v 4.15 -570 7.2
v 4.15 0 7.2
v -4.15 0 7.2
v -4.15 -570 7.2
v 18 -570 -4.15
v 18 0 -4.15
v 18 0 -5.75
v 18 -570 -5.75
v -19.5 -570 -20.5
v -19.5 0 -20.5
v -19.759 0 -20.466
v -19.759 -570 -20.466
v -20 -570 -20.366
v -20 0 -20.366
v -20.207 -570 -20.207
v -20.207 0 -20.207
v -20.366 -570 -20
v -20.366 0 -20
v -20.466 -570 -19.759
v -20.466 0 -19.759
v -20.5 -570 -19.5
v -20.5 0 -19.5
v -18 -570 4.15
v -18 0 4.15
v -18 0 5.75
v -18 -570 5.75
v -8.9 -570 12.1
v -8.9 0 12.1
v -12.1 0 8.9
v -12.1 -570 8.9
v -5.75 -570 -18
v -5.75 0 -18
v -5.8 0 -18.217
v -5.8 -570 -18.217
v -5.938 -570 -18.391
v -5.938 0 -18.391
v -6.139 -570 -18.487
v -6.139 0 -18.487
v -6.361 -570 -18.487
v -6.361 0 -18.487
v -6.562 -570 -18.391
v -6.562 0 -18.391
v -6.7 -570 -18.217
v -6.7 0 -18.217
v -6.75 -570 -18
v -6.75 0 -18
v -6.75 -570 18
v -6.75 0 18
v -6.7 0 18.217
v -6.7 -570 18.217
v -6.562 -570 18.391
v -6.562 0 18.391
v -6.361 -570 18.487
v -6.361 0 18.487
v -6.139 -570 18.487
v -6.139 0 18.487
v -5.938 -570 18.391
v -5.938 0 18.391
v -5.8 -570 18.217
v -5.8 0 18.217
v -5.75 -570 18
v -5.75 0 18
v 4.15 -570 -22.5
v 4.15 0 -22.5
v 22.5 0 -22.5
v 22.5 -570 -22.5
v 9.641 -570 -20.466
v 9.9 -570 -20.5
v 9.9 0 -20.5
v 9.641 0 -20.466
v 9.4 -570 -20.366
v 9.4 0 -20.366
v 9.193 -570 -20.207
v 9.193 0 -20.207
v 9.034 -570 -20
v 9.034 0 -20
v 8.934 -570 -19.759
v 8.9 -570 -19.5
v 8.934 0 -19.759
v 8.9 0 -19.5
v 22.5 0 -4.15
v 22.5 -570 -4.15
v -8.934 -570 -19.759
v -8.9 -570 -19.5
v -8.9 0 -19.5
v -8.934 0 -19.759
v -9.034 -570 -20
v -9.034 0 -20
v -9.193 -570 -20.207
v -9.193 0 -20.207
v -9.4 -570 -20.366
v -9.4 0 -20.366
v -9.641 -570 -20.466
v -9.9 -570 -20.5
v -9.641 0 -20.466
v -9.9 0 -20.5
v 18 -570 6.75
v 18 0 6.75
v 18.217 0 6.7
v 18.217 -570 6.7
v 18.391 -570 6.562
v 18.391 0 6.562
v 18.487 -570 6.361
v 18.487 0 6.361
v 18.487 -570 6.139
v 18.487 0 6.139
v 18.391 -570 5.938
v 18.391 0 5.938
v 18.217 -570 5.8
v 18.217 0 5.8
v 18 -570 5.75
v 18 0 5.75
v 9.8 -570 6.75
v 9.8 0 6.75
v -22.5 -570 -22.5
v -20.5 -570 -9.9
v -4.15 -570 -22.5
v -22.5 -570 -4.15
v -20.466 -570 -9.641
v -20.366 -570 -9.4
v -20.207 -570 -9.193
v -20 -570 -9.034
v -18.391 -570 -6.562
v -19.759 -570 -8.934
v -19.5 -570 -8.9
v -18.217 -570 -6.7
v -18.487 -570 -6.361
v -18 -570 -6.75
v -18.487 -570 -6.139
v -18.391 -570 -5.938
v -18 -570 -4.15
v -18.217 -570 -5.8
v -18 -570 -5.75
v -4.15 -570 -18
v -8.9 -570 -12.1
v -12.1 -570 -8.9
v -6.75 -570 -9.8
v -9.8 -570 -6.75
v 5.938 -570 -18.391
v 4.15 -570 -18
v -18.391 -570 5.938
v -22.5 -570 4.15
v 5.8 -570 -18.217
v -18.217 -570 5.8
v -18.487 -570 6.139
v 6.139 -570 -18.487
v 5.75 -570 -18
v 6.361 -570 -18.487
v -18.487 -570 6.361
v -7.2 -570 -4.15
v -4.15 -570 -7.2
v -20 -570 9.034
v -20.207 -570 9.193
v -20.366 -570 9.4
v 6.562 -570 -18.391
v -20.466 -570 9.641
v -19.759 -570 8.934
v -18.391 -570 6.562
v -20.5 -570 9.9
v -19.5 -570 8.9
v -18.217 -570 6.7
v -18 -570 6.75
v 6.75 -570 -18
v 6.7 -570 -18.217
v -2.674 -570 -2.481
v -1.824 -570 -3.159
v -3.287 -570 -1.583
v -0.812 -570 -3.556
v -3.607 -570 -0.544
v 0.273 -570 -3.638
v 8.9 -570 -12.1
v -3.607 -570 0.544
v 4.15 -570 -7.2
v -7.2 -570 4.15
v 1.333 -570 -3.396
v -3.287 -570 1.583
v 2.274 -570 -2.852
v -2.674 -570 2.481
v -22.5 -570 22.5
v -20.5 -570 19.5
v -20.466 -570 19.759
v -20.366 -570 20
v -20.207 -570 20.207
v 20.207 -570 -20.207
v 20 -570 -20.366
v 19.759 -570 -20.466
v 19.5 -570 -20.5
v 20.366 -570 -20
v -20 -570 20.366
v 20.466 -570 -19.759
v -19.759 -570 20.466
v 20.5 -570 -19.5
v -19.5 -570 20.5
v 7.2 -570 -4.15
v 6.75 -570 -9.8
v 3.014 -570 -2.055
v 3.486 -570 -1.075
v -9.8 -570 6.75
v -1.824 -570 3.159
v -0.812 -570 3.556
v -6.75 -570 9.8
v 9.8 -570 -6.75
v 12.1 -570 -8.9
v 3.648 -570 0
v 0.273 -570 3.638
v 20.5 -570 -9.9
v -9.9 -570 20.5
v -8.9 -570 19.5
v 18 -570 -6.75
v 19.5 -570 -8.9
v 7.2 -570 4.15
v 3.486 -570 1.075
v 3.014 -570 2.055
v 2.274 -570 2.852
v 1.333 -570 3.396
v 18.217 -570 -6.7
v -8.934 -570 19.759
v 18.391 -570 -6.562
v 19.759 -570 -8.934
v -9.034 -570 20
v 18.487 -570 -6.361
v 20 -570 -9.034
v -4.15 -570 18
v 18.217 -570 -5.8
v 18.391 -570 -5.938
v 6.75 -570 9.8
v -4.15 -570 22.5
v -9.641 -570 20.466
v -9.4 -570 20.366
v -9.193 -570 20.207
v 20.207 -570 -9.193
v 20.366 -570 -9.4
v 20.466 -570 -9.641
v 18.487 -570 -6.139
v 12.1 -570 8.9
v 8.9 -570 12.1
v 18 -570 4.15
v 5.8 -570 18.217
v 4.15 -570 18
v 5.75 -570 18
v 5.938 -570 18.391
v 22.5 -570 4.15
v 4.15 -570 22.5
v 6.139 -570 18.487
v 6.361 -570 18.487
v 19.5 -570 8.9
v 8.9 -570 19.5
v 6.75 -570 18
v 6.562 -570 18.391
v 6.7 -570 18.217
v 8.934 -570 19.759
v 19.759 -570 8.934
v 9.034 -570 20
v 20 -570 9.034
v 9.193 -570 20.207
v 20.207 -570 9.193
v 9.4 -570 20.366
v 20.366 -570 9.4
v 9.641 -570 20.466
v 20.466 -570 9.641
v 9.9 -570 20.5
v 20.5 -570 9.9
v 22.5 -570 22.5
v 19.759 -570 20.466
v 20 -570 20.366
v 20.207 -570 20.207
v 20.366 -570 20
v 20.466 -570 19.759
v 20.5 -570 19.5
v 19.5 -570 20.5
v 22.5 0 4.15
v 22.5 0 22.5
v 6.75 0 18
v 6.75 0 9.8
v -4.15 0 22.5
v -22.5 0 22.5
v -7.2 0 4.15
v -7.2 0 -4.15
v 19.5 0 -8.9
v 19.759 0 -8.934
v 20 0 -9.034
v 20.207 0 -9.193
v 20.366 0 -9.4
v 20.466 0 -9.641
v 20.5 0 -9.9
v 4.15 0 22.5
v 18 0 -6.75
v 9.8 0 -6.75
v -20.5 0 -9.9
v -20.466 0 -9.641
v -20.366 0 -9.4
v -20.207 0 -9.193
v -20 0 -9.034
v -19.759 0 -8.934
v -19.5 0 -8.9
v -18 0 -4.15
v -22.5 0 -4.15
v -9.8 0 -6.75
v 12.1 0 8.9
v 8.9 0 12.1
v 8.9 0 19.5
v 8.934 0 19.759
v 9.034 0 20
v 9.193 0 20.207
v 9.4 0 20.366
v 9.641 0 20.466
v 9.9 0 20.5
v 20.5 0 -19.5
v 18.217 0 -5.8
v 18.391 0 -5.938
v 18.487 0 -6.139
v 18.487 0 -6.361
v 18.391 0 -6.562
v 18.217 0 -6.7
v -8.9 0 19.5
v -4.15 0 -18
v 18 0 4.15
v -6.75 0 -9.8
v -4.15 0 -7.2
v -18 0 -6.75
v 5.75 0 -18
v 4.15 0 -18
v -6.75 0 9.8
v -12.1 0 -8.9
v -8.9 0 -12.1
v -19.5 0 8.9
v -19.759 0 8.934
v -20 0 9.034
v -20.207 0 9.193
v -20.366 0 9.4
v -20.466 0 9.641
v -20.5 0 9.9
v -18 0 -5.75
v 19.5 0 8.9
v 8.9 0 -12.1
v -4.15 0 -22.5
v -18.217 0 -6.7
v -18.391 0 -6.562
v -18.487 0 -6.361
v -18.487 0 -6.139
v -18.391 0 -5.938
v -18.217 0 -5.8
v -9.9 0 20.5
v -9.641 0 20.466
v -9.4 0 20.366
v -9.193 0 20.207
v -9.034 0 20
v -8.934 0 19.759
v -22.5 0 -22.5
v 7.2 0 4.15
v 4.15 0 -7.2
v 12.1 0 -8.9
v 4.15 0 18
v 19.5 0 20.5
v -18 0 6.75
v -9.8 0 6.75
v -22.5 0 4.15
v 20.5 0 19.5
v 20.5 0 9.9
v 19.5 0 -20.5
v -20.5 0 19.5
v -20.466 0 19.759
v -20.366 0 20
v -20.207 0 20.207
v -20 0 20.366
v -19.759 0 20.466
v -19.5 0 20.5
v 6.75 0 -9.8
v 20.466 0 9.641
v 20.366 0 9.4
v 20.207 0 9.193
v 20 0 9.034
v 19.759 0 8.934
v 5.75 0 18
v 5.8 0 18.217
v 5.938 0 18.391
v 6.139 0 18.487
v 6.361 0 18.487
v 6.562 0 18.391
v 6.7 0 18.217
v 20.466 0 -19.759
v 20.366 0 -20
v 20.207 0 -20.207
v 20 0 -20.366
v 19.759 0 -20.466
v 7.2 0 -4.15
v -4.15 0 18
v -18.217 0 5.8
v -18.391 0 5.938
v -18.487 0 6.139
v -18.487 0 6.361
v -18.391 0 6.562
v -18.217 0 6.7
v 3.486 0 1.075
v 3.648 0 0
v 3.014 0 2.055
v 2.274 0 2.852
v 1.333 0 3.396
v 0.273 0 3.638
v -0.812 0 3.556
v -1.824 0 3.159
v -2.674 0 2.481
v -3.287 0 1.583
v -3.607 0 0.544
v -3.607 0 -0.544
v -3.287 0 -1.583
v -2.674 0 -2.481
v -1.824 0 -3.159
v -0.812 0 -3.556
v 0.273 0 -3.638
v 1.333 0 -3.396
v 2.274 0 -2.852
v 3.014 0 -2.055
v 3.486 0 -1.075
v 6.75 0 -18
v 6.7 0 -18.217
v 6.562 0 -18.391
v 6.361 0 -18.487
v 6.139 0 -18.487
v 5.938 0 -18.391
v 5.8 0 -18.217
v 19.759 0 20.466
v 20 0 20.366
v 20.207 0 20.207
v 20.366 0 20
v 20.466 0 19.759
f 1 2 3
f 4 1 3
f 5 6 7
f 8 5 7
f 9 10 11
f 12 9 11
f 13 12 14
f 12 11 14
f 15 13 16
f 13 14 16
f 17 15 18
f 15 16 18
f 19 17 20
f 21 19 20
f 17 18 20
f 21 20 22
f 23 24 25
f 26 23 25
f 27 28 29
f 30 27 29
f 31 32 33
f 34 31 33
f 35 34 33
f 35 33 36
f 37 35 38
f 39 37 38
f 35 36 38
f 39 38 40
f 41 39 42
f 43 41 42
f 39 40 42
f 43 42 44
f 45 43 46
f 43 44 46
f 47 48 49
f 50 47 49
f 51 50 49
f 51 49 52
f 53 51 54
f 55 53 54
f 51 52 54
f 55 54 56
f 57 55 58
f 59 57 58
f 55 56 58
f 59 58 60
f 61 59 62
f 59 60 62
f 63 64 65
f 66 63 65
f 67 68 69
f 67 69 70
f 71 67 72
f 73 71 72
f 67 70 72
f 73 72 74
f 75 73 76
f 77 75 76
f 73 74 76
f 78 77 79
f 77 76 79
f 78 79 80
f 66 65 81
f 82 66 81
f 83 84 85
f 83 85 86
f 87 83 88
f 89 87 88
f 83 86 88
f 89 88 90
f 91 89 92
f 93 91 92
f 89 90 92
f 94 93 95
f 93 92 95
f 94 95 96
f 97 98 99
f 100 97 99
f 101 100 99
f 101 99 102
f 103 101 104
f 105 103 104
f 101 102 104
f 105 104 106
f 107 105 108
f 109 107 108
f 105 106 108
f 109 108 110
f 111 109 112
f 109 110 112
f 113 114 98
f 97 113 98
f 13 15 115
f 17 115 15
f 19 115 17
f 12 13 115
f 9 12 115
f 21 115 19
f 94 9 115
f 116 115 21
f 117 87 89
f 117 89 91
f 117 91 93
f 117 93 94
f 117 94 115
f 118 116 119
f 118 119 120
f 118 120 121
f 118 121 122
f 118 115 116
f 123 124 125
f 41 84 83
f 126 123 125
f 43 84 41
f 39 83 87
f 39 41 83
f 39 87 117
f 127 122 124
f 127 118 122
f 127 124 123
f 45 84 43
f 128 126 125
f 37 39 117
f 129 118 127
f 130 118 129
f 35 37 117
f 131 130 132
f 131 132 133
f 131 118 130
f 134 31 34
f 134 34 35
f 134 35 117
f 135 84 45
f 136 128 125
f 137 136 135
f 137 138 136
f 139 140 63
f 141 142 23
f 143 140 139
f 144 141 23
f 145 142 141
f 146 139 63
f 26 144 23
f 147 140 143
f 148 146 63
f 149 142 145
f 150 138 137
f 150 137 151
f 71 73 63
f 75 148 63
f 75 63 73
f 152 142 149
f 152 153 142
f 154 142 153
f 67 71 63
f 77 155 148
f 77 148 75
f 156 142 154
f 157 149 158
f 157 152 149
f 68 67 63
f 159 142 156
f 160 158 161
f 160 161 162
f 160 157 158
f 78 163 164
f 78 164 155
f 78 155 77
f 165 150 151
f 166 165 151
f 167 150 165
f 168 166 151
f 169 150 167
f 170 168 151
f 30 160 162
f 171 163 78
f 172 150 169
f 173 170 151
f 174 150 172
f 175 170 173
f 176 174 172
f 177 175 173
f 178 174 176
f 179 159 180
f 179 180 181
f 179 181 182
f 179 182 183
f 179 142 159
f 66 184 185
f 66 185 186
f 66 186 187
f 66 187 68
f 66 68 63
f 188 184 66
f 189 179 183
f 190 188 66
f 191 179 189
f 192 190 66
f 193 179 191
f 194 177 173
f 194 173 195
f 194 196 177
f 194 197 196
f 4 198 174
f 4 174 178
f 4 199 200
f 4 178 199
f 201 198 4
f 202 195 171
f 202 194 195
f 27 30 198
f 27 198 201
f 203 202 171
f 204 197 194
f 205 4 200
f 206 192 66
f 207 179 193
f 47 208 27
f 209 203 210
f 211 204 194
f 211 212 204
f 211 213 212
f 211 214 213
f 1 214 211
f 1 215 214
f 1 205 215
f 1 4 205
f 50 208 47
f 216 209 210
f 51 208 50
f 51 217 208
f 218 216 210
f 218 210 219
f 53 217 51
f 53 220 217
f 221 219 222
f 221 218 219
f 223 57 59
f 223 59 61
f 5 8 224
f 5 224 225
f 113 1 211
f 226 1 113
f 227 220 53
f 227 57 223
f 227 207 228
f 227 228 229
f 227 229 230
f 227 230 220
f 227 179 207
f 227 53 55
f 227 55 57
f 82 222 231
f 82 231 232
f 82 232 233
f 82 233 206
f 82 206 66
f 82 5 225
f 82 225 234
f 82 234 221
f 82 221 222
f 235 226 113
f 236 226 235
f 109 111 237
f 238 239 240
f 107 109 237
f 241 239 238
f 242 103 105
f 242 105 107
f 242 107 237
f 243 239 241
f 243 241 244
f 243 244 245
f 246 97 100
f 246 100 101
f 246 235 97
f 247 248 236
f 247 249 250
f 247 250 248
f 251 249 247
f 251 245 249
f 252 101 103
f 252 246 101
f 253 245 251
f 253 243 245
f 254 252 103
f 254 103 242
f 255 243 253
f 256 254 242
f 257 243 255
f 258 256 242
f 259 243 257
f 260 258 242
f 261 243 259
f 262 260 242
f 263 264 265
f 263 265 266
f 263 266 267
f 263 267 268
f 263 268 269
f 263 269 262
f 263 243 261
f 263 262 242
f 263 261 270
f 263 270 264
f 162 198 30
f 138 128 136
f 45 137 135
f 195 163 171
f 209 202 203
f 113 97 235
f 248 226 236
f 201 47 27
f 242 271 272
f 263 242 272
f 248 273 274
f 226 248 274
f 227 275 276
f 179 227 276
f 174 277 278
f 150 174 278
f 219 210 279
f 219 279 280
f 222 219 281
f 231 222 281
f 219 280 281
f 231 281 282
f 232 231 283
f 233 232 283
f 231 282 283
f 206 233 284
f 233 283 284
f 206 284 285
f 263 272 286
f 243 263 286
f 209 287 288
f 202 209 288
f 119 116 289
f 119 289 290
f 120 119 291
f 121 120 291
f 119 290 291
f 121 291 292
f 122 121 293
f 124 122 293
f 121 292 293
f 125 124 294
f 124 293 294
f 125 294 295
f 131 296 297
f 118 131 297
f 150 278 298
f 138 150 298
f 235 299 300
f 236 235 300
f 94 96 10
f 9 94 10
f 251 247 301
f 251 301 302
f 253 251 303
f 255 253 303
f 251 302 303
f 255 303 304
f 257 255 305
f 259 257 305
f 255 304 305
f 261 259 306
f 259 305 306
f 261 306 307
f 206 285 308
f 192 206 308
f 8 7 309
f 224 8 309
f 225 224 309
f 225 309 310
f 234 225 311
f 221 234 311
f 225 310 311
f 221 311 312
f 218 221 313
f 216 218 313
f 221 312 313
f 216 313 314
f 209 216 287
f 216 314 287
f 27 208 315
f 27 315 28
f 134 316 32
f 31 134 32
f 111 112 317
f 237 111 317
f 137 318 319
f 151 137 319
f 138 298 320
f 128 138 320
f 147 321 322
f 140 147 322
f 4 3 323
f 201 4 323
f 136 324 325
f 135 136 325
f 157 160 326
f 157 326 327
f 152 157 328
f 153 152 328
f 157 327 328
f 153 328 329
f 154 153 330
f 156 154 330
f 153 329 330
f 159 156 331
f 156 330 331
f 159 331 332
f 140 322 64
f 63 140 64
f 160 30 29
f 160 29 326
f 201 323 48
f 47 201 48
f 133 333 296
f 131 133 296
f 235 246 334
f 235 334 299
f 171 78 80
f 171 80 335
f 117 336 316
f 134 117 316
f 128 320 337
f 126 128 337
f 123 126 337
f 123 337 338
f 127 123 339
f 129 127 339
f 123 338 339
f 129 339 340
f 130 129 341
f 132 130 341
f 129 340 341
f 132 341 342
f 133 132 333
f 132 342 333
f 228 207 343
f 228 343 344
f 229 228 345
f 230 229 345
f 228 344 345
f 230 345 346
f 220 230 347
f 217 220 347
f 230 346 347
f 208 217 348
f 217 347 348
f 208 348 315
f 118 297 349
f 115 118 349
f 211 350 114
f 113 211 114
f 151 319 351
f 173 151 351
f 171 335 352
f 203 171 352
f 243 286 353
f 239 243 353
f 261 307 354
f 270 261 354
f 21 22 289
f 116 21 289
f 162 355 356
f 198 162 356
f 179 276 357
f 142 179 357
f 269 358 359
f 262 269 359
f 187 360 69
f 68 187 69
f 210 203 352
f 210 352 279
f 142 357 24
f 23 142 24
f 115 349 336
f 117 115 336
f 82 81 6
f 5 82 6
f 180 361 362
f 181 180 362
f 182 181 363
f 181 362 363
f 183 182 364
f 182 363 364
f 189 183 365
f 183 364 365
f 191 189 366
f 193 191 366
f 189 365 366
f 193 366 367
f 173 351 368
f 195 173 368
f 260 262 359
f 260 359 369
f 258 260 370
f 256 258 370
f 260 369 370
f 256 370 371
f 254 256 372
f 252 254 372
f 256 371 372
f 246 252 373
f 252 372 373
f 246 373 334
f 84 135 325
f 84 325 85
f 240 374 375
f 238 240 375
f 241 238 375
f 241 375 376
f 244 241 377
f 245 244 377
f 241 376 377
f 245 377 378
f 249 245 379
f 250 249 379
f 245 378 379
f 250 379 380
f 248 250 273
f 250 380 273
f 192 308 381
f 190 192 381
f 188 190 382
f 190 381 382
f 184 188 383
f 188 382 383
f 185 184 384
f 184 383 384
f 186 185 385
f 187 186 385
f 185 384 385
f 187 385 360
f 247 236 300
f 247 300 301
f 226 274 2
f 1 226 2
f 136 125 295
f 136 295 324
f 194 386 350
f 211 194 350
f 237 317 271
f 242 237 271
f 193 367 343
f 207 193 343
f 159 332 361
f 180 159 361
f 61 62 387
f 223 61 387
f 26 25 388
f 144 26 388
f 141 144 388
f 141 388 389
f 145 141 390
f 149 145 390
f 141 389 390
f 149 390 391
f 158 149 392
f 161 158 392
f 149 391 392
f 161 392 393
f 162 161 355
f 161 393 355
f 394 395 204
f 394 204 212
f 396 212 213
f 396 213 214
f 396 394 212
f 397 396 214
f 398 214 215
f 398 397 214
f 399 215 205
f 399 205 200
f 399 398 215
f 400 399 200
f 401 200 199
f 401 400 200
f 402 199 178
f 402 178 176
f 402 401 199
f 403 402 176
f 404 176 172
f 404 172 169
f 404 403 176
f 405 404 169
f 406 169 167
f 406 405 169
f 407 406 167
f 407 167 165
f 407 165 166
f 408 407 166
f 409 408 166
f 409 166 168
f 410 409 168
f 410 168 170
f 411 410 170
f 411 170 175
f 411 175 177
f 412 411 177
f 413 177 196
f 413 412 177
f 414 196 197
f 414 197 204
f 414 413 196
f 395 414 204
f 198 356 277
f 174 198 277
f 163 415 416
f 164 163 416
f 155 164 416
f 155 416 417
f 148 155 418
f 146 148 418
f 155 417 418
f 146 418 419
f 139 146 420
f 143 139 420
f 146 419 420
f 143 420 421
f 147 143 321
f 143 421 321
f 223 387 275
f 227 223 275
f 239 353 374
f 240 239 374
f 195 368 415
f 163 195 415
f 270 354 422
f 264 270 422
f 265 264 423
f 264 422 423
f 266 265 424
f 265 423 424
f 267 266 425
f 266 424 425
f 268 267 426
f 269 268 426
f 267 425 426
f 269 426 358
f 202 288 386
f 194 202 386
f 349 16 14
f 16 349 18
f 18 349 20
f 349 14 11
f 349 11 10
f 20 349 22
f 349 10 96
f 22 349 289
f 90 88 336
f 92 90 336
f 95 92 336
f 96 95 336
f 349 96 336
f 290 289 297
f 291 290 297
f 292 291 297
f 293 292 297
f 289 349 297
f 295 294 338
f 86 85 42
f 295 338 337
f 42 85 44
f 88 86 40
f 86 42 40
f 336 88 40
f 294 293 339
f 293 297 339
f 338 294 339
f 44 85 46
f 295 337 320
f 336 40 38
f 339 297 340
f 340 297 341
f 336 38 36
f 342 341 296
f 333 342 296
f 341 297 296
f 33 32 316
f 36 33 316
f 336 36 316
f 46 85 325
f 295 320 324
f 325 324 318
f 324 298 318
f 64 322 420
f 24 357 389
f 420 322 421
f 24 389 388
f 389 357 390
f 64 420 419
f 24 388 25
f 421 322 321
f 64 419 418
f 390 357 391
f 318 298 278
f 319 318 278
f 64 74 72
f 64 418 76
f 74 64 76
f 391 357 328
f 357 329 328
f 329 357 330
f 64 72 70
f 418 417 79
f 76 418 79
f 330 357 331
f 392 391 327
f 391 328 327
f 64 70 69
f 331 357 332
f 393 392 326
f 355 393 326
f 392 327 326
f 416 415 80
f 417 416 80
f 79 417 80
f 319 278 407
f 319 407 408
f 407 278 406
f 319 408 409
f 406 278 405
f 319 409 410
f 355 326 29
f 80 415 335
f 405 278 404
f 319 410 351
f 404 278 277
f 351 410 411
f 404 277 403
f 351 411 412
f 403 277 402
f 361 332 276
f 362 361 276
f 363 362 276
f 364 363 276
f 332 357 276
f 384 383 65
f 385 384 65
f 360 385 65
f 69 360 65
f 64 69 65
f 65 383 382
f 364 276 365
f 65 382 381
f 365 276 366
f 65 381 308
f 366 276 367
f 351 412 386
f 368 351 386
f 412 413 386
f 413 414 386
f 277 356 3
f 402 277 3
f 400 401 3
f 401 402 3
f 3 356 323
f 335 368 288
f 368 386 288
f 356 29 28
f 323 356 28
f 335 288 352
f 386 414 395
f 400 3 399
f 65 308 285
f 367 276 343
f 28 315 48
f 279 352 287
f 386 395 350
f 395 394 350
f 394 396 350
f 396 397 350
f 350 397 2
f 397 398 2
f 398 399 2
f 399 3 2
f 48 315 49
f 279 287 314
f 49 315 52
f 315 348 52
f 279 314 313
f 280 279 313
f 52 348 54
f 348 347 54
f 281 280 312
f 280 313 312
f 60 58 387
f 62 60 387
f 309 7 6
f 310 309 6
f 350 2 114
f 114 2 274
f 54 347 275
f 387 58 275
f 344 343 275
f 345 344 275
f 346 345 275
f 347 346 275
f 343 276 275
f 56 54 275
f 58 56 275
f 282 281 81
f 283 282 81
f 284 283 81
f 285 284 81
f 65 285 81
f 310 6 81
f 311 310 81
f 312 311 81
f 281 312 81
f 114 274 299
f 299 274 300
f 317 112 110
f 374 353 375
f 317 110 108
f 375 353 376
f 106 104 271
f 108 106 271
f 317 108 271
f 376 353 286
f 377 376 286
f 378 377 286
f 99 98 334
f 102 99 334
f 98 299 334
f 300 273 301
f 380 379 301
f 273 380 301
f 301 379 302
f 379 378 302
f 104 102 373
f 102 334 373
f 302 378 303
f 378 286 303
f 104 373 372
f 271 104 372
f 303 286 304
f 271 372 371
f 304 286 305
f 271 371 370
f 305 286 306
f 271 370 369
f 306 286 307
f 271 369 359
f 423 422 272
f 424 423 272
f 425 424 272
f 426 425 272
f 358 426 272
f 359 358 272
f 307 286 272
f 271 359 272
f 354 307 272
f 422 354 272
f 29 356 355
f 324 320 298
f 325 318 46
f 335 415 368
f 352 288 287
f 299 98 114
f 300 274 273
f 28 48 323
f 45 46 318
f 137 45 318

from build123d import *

# Parameters (mm, degrees)
F0_R     = 3.647768
F1_DEPTH = 570


with BuildPart() as f1:
    # F0 (on Front) → F1 (new body)
    with BuildSketch(Plane.XZ):
        with BuildLine():
            Line((-4.15, 22.5), (-22.5, 22.5))
            Line((-22.5, 22.5), (-22.5, 4.15))
            Line((-22.5, 4.15), (-18, 4.15))
            Line((-18, 4.15), (-18, 5.75))
            ThreePointArc((-18, 5.75), (-18.5, 6.25), (-18, 6.75))
            Line((-18, 6.75), (-9.8, 6.75))
            Line((-9.8, 6.75), (-7.2, 4.15))
            Line((-7.2, 4.15), (-7.2, -4.15))
            Line((-7.2, -4.15), (-9.8, -6.75))
            Line((-9.8, -6.75), (-18, -6.75))
            ThreePointArc((-18, -6.75), (-18.5, -6.25), (-18, -5.75))
            Line((-18, -5.75), (-18, -4.15))
            Line((-18, -4.15), (-22.5, -4.15))
            Line((-22.5, -4.15), (-22.5, -22.5))
            Line((-22.5, -22.5), (-4.15, -22.5))
            Line((-4.15, -22.5), (-4.15, -18))
            Line((-4.15, -18), (-5.75, -18))
            ThreePointArc((-5.75, -18), (-6.25, -18.5), (-6.75, -18))
            Line((-6.75, -18), (-6.75, -9.8))
            Line((-6.75, -9.8), (-4.15, -7.2))
            Line((-4.15, -7.2), (4.15, -7.2))
            Line((4.15, -7.2), (6.75, -9.8))
            Line((6.75, -9.8), (6.75, -18))
            ThreePointArc((6.75, -18), (6.25, -18.5), (5.75, -18))
            Line((5.75, -18), (4.15, -18))
            Line((4.15, -18), (4.15, -22.5))
            Line((4.15, -22.5), (22.5, -22.5))
            Line((22.5, -22.5), (22.5, -4.15))
            Line((22.5, -4.15), (18, -4.15))
            Line((18, -4.15), (18, -5.75))
            ThreePointArc((18, -5.75), (18.5, -6.25), (18, -6.75))
            Line((18, -6.75), (9.8, -6.75))
            Line((9.8, -6.75), (7.2, -4.15))
            Line((7.2, -4.15), (7.2, 4.15))
            Line((7.2, 4.15), (9.8, 6.75))
            Line((9.8, 6.75), (18, 6.75))
            ThreePointArc((18, 6.75), (18.5, 6.25), (18, 5.75))
            Line((18, 5.75), (18, 4.15))
            Line((18, 4.15), (22.5, 4.15))
            Line((22.5, 4.15), (22.5, 22.5))
            Line((22.5, 22.5), (4.15, 22.5))
            Line((4.15, 22.5), (4.15, 18))
            Line((4.15, 18), (5.75, 18))
            ThreePointArc((5.75, 18), (6.25, 18.5), (6.75, 18))
            Line((6.75, 18), (6.75, 9.8))
            Line((6.75, 9.8), (4.15, 7.2))
            Line((4.15, 7.2), (-4.15, 7.2))
            Line((-4.15, 7.2), (-6.75, 9.8))
            Line((-6.75, 9.8), (-6.75, 18))
            ThreePointArc((-6.75, 18), (-6.25, 18.5), (-5.75, 18))
            Line((-5.75, 18), (-4.15, 18))
            Line((-4.15, 18), (-4.15, 22.5))
        make_face()
        with BuildLine():
            Line((-8.9, -12.1), (-8.9, -19.5))
            ThreePointArc((-8.9, -19.5), (-9.192893, -20.207107), (-9.9, -20.5))
            Line((-9.9, -20.5), (-19.5, -20.5))
            ThreePointArc((-19.5, -20.5), (-20.207107, -20.207107), (-20.5, -19.5))
            Line((-20.5, -19.5), (-20.5, -9.9))
            ThreePointArc((-20.5, -9.9), (-20.207107, -9.192893), (-19.5, -8.9))
            Line((-19.5, -8.9), (-12.1, -8.9))
            Line((-12.1, -8.9), (-8.9, -12.1))
        make_face(mode=Mode.SUBTRACT)
        with BuildLine():
            Line((8.9, -12.1), (12.1, -8.9))
            Line((12.1, -8.9), (19.5, -8.9))
            ThreePointArc((19.5, -8.9), (20.207107, -9.192893), (20.5, -9.9))
            Line((20.5, -9.9), (20.5, -19.5))
            ThreePointArc((20.5, -19.5), (20.207107, -20.207107), (19.5, -20.5))
            Line((19.5, -20.5), (9.9, -20.5))
            ThreePointArc((9.9, -20.5), (9.192893, -20.207107), (8.9, -19.5))
            Line((8.9, -19.5), (8.9, -12.1))
        make_face(mode=Mode.SUBTRACT)
        with BuildLine():
            ThreePointArc((-20.5, 19.5), (-20.207107, 20.207107), (-19.5, 20.5))
            Line((-19.5, 20.5), (-9.9, 20.5))
            ThreePointArc((-9.9, 20.5), (-9.192893, 20.207107), (-8.9, 19.5))
            Line((-8.9, 19.5), (-8.9, 12.1))
            Line((-8.9, 12.1), (-12.1, 8.9))
            Line((-12.1, 8.9), (-19.5, 8.9))
            ThreePointArc((-19.5, 8.9), (-20.207107, 9.192893), (-20.5, 9.9))
            Line((-20.5, 9.9), (-20.5, 19.5))
        make_face(mode=Mode.SUBTRACT)
        Circle(F0_R, mode=Mode.SUBTRACT)
        with BuildLine():
            Line((12.1, 8.9), (8.9, 12.1))
            Line((8.9, 12.1), (8.9, 19.5))
            ThreePointArc((8.9, 19.5), (9.192893, 20.207107), (9.9, 20.5))
            Line((9.9, 20.5), (19.5, 20.5))
            ThreePointArc((19.5, 20.5), (20.207107, 20.207107), (20.5, 19.5))
            Line((20.5, 19.5), (20.5, 9.9))
            ThreePointArc((20.5, 9.9), (20.207107, 9.192893), (19.5, 8.9))
            Line((19.5, 8.9), (12.1, 8.9))
        make_face(mode=Mode.SUBTRACT)
    extrude(amount=F1_DEPTH)


solid = f1.part
